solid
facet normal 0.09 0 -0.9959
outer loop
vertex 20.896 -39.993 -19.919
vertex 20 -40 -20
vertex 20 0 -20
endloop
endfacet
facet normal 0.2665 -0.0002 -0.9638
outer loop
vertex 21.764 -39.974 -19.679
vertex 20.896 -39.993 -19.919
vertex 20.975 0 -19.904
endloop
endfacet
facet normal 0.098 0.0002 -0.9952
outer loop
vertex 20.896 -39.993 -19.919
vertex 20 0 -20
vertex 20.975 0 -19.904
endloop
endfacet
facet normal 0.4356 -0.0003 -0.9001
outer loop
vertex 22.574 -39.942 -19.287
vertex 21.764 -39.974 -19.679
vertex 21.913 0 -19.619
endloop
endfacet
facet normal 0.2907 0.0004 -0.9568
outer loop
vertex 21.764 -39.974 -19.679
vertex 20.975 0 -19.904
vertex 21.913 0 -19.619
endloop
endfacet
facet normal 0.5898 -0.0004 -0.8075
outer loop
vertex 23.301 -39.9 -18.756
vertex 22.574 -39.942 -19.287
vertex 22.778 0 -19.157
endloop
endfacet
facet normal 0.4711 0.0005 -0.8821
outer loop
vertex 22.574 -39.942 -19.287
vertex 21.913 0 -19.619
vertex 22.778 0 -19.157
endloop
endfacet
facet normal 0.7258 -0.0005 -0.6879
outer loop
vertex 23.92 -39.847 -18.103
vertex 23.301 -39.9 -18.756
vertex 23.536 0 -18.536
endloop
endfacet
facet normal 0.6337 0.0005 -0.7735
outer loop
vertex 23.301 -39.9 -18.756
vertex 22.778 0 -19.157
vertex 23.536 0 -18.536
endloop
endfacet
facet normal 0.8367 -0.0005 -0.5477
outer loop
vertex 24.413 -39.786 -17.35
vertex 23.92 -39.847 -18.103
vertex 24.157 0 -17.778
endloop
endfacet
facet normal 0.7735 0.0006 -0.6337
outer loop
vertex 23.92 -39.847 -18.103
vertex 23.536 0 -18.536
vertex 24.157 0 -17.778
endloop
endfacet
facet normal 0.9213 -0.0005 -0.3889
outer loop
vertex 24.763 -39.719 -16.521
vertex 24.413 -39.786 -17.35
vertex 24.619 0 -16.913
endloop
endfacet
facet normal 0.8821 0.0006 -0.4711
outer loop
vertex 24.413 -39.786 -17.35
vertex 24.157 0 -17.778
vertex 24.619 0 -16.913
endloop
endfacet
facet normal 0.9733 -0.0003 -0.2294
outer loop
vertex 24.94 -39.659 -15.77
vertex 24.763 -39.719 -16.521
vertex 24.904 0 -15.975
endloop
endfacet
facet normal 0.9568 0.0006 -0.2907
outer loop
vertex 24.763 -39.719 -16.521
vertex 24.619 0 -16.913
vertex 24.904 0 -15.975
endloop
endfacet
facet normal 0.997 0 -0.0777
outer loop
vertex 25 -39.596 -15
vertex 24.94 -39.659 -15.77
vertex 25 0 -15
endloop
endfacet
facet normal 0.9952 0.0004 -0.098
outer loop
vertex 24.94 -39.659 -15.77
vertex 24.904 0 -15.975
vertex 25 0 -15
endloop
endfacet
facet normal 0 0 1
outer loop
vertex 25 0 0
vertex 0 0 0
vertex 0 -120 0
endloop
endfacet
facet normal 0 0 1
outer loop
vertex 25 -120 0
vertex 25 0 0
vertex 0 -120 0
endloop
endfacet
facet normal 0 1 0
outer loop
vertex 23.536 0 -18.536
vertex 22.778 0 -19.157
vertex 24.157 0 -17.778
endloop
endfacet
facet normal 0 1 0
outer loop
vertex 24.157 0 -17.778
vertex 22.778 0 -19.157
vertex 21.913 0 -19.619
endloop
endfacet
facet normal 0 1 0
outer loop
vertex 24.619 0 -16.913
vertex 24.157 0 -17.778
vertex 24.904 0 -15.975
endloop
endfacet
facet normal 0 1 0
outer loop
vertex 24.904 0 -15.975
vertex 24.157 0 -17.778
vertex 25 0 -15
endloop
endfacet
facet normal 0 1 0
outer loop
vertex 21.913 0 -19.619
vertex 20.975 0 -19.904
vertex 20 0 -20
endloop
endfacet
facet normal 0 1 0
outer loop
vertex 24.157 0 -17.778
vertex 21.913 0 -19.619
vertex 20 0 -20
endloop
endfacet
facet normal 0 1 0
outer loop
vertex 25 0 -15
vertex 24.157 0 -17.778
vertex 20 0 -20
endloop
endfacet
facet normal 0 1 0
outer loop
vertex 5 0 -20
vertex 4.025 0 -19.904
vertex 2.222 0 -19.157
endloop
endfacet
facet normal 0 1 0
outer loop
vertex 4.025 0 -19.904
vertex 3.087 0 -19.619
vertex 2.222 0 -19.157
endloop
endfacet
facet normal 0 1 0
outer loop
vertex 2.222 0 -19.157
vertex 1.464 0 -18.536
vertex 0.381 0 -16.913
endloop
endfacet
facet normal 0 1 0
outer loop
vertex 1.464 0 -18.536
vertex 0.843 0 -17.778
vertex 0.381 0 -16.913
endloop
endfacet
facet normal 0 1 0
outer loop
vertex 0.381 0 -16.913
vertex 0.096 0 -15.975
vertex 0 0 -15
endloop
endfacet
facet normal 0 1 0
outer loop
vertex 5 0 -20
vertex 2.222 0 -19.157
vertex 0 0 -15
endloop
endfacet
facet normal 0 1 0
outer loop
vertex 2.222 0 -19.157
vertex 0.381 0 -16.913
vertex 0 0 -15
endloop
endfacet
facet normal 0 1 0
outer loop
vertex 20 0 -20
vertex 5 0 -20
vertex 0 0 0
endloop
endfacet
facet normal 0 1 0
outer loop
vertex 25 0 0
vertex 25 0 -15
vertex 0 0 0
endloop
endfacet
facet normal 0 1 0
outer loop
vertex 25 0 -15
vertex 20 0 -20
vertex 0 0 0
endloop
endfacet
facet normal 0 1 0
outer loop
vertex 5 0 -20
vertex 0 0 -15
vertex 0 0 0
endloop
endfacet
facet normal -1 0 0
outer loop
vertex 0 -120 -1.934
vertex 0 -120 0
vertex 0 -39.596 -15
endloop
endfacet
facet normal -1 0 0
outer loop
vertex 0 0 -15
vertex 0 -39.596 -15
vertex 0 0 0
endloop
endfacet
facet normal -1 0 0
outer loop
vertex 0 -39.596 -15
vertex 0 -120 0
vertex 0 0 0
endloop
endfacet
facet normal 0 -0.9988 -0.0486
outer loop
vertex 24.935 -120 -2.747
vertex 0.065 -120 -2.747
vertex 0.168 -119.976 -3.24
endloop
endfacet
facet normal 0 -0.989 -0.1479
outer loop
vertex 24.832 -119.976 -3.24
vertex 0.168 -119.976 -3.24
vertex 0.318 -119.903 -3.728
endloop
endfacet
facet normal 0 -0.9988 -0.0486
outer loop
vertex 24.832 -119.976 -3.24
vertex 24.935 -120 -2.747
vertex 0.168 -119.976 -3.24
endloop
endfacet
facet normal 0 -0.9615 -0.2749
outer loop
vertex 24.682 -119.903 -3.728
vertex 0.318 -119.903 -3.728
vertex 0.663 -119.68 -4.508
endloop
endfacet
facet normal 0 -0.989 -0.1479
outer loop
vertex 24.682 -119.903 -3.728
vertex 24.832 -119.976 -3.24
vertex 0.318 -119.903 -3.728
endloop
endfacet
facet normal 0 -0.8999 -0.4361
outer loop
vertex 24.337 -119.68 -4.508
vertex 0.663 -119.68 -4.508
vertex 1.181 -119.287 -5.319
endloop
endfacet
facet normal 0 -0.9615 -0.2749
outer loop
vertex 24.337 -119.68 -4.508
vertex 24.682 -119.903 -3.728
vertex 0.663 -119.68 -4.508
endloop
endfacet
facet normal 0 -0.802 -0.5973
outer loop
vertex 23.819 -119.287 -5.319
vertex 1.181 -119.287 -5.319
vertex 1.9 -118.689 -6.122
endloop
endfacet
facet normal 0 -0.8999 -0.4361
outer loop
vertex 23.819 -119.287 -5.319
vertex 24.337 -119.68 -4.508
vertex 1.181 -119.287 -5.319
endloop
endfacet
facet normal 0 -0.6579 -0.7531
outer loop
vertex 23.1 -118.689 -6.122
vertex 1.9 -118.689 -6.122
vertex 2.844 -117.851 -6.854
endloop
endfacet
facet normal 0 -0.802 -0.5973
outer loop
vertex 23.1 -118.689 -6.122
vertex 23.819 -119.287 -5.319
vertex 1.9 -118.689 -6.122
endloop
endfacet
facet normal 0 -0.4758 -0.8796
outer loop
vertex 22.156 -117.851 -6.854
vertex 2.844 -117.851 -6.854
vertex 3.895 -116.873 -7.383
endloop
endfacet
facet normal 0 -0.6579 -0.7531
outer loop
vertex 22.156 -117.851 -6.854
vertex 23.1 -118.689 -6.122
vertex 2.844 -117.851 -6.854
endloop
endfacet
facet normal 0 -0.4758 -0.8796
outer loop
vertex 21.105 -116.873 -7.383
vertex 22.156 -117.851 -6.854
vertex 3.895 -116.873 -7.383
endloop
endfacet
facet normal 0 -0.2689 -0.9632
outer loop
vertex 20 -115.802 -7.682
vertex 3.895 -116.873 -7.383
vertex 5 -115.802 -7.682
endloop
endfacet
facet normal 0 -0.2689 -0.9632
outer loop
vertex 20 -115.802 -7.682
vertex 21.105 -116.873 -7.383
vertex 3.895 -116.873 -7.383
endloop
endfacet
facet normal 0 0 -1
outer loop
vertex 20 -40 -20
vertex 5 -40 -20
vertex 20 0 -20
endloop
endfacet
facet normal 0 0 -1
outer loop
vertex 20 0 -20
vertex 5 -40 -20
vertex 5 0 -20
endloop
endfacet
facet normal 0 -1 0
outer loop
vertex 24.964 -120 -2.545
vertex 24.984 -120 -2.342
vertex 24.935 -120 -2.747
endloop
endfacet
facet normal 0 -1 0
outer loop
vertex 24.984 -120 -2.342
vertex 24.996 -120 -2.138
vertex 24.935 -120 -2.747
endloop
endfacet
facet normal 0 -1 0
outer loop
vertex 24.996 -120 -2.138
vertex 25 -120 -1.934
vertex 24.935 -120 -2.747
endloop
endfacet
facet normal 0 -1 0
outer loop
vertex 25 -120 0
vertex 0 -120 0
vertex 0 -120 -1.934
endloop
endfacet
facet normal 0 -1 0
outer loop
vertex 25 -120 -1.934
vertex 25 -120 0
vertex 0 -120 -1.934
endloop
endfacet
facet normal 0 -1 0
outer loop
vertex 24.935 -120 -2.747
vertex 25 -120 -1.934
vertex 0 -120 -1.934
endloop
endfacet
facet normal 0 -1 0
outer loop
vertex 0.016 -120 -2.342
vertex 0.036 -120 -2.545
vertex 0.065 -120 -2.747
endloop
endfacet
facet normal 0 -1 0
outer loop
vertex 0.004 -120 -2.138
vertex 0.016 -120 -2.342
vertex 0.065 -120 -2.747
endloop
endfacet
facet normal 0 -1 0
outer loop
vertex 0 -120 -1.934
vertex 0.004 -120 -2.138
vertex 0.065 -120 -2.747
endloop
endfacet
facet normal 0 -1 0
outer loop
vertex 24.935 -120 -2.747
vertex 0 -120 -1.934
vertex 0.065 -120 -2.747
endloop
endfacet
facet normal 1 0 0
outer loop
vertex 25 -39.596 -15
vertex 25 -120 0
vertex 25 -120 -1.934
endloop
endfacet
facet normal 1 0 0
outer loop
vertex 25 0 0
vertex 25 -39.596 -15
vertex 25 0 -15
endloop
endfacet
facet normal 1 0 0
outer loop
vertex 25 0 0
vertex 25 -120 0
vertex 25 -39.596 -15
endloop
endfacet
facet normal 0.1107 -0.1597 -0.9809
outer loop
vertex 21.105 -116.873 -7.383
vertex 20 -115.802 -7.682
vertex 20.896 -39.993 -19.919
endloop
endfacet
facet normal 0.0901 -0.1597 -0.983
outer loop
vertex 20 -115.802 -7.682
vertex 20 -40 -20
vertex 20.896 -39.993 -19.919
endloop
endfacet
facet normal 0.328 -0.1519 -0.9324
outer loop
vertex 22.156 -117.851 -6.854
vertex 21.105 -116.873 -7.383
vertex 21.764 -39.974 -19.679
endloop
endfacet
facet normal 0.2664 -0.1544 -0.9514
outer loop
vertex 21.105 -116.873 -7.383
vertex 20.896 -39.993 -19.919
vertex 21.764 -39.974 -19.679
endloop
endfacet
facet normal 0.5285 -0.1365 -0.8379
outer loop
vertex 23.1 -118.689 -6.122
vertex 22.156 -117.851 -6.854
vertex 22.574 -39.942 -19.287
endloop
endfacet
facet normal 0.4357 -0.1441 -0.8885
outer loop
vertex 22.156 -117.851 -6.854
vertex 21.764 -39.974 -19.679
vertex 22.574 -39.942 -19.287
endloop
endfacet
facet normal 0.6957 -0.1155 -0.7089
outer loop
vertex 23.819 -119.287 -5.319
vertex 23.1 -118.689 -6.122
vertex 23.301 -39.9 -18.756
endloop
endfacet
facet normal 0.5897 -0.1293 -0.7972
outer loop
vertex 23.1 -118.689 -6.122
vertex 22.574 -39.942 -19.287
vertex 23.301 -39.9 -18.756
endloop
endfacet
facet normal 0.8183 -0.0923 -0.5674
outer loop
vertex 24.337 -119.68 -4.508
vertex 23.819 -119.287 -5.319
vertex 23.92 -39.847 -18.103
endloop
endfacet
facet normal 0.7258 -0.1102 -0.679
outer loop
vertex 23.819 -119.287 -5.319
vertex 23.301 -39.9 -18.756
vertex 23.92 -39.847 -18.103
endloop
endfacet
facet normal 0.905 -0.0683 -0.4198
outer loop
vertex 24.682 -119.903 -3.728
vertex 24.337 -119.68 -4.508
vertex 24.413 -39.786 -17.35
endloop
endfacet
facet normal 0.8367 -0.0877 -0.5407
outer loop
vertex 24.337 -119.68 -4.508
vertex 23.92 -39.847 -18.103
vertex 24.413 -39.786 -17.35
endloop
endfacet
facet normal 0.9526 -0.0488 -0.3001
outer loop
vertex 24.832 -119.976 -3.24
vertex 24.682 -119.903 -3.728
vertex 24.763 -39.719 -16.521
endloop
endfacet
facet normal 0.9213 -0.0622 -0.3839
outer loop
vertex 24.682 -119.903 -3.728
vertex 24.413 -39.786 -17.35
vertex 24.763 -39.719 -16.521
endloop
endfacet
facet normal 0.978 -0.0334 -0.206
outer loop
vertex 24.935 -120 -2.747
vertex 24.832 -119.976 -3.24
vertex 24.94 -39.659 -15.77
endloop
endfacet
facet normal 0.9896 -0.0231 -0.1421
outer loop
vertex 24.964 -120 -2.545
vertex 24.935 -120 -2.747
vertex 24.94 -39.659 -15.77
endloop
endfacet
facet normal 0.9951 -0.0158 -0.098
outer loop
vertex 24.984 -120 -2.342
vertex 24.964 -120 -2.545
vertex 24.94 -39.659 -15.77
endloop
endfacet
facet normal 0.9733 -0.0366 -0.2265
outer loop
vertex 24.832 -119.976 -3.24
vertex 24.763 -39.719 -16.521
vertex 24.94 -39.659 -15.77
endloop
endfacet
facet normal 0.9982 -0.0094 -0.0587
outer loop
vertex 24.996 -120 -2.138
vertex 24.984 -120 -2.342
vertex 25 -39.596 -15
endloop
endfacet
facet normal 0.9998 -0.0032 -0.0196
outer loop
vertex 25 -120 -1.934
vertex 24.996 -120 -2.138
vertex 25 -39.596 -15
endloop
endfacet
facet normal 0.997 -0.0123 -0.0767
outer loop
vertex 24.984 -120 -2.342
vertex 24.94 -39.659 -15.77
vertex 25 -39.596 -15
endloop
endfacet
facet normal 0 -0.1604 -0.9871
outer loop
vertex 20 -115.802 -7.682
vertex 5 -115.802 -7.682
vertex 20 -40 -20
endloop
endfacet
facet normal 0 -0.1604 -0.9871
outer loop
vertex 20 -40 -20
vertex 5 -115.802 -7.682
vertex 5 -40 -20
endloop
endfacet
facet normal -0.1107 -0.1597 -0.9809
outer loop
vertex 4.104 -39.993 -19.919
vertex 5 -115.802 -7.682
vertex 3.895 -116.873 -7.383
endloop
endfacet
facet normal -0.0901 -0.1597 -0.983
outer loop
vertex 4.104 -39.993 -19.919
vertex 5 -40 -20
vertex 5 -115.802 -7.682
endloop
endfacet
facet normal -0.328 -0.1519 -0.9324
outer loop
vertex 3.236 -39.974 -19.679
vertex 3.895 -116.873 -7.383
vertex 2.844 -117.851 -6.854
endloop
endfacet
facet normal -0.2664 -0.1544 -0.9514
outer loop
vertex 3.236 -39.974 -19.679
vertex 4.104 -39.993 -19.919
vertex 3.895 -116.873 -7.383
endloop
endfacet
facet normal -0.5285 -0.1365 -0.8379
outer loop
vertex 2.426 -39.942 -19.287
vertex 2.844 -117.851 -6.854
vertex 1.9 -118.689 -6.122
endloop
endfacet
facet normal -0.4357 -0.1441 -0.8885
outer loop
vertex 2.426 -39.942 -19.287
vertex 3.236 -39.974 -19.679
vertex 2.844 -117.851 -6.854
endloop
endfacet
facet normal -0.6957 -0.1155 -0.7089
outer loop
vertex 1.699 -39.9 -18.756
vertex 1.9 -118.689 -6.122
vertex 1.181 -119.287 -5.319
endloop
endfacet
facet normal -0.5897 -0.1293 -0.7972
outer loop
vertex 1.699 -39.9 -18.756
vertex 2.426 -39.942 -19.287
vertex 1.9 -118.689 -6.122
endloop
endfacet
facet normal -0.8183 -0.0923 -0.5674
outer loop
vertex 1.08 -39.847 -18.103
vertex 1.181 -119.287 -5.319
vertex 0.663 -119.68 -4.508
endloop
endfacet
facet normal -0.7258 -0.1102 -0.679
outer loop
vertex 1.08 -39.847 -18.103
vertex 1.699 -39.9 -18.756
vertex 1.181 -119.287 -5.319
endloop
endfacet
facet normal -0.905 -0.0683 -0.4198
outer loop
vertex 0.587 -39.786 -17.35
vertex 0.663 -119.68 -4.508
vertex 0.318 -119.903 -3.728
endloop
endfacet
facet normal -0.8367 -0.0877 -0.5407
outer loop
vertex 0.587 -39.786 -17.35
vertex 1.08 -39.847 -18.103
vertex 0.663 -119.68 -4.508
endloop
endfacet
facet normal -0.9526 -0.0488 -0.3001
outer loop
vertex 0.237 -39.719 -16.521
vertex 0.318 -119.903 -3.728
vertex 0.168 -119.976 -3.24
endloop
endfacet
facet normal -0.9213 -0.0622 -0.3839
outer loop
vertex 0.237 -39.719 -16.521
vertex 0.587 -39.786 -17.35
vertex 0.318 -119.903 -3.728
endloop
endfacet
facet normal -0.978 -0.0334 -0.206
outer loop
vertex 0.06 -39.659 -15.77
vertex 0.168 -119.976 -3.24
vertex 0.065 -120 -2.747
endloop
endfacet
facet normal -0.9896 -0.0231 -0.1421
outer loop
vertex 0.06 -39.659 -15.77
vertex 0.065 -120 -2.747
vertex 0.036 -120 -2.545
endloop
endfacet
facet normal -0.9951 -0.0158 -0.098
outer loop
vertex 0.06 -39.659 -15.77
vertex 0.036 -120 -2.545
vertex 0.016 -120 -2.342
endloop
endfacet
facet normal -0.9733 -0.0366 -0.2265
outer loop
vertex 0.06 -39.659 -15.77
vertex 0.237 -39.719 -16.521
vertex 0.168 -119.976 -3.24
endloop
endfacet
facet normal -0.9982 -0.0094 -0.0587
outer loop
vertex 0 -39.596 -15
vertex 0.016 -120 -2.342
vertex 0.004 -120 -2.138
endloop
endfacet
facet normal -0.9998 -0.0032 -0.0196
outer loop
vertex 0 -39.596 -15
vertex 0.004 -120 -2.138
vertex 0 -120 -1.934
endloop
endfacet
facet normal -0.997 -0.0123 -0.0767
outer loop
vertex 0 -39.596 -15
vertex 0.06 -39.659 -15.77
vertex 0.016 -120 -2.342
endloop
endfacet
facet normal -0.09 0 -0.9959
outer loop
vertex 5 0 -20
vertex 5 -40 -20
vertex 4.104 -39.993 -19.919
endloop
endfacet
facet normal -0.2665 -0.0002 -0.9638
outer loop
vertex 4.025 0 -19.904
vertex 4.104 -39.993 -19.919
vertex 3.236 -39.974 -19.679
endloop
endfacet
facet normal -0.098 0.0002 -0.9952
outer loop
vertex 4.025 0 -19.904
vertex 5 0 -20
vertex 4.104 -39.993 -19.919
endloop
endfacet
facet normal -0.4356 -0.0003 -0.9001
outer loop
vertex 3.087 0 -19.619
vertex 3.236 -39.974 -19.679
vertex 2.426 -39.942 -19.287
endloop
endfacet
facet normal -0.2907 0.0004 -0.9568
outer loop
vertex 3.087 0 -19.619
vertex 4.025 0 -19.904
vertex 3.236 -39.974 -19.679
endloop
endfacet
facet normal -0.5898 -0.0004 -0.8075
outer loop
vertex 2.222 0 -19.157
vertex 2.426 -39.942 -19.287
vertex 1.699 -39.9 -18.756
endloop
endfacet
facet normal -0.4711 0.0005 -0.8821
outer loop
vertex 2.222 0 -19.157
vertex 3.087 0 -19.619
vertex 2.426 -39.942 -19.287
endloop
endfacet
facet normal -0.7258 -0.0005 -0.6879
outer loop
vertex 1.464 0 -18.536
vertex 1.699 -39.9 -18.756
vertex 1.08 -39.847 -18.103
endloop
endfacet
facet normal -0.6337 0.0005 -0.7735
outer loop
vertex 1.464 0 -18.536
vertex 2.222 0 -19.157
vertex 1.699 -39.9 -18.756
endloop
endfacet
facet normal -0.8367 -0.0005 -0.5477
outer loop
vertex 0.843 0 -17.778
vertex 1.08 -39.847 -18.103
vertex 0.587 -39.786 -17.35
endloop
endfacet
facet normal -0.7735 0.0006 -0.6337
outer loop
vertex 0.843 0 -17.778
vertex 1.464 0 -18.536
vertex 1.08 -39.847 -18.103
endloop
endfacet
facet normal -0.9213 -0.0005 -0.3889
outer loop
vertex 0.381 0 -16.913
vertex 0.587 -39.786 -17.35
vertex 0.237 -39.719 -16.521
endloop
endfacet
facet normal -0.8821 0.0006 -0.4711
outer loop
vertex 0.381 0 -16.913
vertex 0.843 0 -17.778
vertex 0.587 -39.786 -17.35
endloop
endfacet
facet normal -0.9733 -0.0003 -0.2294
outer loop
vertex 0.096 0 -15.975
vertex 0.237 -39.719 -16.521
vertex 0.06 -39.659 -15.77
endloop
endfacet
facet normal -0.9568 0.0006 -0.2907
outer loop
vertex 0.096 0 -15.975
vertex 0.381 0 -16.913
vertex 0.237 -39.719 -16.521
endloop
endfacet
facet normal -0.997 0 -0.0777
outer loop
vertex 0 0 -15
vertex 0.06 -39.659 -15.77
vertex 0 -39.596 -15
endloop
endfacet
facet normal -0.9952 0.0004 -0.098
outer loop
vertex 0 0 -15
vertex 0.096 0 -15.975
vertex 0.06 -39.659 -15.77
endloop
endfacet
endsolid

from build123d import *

# Parameters (mm, degrees)
F1_DEPTH = 25
F2_R     = 5


with BuildPart() as f1:
    # F0 (on Right) → F1 (new body)
    with BuildSketch(Plane.YZ):
        Polygon((0, -20), (0, 0), (-120, 0), (-120, -7), (-40, -20), align=None)
    extrude(amount=F1_DEPTH)

    # F2
    f2_edges = [f1.edges().sort_by_distance(p)[0] for p in [
        (25, -20, -20),
        (25, -80, -13.5),
        (12.5, -120, -7),
        (0, -80, -13.5),
        (0, -20, -20),
    ]]
    fillet(f2_edges, radius=F2_R)


solid = f1.part
